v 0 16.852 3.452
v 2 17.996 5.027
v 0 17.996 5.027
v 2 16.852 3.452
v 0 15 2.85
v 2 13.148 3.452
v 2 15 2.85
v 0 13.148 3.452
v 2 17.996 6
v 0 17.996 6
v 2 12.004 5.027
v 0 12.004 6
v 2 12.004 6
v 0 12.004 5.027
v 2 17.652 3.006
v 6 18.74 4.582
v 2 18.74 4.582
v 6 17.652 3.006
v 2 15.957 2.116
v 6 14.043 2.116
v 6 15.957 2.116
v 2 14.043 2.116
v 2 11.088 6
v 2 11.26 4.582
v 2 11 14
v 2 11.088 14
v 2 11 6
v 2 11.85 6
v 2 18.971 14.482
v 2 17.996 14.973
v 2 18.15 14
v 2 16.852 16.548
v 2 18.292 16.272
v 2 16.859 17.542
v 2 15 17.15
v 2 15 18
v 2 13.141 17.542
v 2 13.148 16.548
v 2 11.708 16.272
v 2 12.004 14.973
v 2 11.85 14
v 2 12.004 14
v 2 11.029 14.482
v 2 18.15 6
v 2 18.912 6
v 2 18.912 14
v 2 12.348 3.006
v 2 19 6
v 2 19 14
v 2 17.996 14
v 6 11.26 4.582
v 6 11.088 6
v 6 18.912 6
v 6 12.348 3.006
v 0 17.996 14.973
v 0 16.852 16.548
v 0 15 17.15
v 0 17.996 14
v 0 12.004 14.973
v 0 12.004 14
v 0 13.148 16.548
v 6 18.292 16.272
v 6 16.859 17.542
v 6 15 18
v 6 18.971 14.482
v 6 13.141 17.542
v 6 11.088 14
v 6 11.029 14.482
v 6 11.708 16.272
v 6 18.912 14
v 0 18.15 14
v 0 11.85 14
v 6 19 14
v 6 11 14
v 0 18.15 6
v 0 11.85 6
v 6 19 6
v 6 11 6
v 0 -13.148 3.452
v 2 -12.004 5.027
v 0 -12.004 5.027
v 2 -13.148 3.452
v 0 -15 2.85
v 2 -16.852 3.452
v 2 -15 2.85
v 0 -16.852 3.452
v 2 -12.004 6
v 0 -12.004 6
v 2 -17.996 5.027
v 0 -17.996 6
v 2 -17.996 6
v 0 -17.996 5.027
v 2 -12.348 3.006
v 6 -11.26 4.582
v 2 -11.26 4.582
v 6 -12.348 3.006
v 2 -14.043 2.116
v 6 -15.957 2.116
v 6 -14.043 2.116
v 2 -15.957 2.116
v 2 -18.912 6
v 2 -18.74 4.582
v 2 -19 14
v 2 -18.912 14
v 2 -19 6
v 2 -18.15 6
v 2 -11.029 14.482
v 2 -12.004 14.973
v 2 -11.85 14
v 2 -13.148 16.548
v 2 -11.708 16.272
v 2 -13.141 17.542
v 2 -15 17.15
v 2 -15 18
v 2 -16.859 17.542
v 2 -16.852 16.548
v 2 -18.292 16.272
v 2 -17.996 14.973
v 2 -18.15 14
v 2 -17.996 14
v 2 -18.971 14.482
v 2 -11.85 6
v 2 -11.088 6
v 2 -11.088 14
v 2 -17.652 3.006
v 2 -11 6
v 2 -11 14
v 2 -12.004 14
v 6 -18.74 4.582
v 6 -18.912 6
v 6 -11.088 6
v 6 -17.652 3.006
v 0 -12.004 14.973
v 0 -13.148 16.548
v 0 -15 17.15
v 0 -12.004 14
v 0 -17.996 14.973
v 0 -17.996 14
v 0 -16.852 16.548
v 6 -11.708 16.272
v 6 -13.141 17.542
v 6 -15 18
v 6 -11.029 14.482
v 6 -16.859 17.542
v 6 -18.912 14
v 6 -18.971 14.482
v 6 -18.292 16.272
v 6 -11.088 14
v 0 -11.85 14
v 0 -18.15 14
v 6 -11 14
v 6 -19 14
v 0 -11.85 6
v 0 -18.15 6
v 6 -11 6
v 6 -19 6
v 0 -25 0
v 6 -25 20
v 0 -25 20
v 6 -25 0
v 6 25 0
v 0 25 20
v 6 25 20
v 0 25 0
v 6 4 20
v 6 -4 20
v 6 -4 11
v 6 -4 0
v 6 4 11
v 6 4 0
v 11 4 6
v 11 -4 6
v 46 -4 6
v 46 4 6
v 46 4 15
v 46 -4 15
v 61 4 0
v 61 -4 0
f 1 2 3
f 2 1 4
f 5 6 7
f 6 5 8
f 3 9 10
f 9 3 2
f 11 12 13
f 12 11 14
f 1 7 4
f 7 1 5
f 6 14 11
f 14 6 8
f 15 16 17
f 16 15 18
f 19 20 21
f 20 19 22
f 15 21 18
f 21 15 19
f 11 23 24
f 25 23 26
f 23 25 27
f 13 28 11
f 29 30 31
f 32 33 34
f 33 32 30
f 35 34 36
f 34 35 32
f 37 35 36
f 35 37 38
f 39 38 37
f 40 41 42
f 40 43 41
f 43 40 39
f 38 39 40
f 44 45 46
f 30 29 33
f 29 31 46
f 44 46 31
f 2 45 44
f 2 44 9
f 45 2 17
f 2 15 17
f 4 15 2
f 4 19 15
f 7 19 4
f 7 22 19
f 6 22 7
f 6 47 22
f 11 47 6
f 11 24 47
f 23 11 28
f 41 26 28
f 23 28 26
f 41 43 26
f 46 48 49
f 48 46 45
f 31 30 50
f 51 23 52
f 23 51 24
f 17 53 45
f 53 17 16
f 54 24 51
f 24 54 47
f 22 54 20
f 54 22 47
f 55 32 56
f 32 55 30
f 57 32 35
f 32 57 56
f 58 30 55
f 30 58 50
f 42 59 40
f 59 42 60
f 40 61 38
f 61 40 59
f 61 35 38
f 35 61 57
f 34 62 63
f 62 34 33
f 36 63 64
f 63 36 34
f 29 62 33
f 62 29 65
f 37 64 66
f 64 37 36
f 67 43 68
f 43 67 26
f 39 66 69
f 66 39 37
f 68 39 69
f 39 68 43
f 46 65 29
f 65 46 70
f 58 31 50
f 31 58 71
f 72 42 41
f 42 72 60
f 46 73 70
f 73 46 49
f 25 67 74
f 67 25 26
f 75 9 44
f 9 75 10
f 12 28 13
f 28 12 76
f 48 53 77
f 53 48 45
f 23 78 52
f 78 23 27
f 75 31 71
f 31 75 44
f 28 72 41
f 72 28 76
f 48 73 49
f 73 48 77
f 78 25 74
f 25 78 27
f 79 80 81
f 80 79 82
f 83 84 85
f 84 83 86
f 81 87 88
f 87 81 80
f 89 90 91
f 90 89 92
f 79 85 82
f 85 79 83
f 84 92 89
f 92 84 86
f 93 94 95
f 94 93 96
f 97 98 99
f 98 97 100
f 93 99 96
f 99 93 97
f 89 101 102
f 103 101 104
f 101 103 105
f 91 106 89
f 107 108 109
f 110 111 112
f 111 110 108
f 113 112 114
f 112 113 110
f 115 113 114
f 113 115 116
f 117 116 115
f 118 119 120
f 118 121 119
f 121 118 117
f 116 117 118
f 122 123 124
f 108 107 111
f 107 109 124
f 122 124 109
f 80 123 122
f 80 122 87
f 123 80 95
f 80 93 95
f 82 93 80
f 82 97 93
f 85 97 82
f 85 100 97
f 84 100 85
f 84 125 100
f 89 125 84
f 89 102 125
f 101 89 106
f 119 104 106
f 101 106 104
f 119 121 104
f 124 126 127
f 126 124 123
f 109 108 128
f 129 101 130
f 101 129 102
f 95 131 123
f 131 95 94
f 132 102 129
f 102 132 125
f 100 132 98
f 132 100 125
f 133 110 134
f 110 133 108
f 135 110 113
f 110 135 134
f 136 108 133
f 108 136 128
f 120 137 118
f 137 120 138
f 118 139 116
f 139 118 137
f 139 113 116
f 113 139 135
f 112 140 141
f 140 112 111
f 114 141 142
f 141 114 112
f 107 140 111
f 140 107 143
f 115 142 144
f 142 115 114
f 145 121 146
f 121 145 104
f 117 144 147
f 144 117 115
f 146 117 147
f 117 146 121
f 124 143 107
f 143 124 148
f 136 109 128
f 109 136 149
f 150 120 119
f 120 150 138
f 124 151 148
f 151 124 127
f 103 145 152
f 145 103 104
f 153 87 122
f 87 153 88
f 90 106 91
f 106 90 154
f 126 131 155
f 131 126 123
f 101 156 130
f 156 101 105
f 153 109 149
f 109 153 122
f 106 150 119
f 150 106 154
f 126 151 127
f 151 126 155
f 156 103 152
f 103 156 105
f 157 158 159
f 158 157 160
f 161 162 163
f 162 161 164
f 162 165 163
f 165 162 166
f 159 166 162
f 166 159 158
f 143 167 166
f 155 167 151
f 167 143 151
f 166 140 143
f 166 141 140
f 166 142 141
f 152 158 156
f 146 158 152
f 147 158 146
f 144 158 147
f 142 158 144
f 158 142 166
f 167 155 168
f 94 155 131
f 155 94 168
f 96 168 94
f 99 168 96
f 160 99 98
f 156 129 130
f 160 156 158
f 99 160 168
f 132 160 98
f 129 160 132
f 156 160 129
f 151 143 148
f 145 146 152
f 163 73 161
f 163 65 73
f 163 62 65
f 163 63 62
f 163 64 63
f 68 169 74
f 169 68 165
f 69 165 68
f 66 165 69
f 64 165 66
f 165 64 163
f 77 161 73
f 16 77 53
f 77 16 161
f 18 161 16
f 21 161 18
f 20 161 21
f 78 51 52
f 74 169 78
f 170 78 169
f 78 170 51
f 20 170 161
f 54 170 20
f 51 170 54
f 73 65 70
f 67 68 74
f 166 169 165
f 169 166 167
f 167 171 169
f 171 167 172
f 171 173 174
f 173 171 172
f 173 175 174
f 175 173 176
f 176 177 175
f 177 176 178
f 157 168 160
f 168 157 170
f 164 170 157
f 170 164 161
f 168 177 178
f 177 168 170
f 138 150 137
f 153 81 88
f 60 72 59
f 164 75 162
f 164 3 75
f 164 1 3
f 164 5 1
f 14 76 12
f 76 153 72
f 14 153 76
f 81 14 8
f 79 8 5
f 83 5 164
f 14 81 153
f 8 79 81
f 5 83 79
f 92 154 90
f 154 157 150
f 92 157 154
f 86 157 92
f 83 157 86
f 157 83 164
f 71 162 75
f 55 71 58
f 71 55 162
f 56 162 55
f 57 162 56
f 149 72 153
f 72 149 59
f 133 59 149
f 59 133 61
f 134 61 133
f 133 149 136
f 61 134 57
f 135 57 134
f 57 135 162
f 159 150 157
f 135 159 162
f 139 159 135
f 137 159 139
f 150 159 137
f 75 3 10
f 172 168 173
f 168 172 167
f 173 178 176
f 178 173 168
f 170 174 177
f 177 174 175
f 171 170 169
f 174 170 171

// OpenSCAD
module drillhole(hole=6.3, 
		head=8, adjust=8) {

	translate([-adjust/2,0,-10]) {
		cylinder(h=20, r=hole/2);
		cylinder(h=10, r=head/2);
	}
	translate([adjust/2,0,-10]) { 
		cylinder(h=20, r=hole/2);
		cylinder(h=10, r=head/2);
	}
	translate([-adjust/2,-hole/2, -10])
		cube([adjust,hole,20]);

	translate([-adjust/2,-head/2, -10])
		cube([adjust,head,10]);
}


module catch(width=50,
	height=20,
	prongw=8,
	prongh=6,
	prongl=40) {
	
	difference() {
	
	translate([(15+prongl+6),-width/2,0])	
	rotate([90,0,180]) 
	linear_extrude(height=width) polygon([
		[0,0],
		[15,15],
		[15,prongh],
		[15+prongl-5,prongh],
		[15+prongl,prongh+5],
		[15+prongl,height],
		[15+prongl+6, height],
		[15+prongl+6,0],
		[0,0]
	]);
	translate([6,-10-width/2, -5])
	cube([prongl+15+10,(width-prongw)/2+10,height+10]);

	translate([6,prongw/2, -5])
	cube([prongl+15+10,(width-prongw)/2+10,height+10]);
	
		// Drill holes

		translate([2,width/2-10,height/2]) rotate([0,-90,0]) drillhole();
		translate([2,-width/2+10,height/2]) rotate([0,-90,0]) drillhole();
	}
}


catch();
//drillhole();
